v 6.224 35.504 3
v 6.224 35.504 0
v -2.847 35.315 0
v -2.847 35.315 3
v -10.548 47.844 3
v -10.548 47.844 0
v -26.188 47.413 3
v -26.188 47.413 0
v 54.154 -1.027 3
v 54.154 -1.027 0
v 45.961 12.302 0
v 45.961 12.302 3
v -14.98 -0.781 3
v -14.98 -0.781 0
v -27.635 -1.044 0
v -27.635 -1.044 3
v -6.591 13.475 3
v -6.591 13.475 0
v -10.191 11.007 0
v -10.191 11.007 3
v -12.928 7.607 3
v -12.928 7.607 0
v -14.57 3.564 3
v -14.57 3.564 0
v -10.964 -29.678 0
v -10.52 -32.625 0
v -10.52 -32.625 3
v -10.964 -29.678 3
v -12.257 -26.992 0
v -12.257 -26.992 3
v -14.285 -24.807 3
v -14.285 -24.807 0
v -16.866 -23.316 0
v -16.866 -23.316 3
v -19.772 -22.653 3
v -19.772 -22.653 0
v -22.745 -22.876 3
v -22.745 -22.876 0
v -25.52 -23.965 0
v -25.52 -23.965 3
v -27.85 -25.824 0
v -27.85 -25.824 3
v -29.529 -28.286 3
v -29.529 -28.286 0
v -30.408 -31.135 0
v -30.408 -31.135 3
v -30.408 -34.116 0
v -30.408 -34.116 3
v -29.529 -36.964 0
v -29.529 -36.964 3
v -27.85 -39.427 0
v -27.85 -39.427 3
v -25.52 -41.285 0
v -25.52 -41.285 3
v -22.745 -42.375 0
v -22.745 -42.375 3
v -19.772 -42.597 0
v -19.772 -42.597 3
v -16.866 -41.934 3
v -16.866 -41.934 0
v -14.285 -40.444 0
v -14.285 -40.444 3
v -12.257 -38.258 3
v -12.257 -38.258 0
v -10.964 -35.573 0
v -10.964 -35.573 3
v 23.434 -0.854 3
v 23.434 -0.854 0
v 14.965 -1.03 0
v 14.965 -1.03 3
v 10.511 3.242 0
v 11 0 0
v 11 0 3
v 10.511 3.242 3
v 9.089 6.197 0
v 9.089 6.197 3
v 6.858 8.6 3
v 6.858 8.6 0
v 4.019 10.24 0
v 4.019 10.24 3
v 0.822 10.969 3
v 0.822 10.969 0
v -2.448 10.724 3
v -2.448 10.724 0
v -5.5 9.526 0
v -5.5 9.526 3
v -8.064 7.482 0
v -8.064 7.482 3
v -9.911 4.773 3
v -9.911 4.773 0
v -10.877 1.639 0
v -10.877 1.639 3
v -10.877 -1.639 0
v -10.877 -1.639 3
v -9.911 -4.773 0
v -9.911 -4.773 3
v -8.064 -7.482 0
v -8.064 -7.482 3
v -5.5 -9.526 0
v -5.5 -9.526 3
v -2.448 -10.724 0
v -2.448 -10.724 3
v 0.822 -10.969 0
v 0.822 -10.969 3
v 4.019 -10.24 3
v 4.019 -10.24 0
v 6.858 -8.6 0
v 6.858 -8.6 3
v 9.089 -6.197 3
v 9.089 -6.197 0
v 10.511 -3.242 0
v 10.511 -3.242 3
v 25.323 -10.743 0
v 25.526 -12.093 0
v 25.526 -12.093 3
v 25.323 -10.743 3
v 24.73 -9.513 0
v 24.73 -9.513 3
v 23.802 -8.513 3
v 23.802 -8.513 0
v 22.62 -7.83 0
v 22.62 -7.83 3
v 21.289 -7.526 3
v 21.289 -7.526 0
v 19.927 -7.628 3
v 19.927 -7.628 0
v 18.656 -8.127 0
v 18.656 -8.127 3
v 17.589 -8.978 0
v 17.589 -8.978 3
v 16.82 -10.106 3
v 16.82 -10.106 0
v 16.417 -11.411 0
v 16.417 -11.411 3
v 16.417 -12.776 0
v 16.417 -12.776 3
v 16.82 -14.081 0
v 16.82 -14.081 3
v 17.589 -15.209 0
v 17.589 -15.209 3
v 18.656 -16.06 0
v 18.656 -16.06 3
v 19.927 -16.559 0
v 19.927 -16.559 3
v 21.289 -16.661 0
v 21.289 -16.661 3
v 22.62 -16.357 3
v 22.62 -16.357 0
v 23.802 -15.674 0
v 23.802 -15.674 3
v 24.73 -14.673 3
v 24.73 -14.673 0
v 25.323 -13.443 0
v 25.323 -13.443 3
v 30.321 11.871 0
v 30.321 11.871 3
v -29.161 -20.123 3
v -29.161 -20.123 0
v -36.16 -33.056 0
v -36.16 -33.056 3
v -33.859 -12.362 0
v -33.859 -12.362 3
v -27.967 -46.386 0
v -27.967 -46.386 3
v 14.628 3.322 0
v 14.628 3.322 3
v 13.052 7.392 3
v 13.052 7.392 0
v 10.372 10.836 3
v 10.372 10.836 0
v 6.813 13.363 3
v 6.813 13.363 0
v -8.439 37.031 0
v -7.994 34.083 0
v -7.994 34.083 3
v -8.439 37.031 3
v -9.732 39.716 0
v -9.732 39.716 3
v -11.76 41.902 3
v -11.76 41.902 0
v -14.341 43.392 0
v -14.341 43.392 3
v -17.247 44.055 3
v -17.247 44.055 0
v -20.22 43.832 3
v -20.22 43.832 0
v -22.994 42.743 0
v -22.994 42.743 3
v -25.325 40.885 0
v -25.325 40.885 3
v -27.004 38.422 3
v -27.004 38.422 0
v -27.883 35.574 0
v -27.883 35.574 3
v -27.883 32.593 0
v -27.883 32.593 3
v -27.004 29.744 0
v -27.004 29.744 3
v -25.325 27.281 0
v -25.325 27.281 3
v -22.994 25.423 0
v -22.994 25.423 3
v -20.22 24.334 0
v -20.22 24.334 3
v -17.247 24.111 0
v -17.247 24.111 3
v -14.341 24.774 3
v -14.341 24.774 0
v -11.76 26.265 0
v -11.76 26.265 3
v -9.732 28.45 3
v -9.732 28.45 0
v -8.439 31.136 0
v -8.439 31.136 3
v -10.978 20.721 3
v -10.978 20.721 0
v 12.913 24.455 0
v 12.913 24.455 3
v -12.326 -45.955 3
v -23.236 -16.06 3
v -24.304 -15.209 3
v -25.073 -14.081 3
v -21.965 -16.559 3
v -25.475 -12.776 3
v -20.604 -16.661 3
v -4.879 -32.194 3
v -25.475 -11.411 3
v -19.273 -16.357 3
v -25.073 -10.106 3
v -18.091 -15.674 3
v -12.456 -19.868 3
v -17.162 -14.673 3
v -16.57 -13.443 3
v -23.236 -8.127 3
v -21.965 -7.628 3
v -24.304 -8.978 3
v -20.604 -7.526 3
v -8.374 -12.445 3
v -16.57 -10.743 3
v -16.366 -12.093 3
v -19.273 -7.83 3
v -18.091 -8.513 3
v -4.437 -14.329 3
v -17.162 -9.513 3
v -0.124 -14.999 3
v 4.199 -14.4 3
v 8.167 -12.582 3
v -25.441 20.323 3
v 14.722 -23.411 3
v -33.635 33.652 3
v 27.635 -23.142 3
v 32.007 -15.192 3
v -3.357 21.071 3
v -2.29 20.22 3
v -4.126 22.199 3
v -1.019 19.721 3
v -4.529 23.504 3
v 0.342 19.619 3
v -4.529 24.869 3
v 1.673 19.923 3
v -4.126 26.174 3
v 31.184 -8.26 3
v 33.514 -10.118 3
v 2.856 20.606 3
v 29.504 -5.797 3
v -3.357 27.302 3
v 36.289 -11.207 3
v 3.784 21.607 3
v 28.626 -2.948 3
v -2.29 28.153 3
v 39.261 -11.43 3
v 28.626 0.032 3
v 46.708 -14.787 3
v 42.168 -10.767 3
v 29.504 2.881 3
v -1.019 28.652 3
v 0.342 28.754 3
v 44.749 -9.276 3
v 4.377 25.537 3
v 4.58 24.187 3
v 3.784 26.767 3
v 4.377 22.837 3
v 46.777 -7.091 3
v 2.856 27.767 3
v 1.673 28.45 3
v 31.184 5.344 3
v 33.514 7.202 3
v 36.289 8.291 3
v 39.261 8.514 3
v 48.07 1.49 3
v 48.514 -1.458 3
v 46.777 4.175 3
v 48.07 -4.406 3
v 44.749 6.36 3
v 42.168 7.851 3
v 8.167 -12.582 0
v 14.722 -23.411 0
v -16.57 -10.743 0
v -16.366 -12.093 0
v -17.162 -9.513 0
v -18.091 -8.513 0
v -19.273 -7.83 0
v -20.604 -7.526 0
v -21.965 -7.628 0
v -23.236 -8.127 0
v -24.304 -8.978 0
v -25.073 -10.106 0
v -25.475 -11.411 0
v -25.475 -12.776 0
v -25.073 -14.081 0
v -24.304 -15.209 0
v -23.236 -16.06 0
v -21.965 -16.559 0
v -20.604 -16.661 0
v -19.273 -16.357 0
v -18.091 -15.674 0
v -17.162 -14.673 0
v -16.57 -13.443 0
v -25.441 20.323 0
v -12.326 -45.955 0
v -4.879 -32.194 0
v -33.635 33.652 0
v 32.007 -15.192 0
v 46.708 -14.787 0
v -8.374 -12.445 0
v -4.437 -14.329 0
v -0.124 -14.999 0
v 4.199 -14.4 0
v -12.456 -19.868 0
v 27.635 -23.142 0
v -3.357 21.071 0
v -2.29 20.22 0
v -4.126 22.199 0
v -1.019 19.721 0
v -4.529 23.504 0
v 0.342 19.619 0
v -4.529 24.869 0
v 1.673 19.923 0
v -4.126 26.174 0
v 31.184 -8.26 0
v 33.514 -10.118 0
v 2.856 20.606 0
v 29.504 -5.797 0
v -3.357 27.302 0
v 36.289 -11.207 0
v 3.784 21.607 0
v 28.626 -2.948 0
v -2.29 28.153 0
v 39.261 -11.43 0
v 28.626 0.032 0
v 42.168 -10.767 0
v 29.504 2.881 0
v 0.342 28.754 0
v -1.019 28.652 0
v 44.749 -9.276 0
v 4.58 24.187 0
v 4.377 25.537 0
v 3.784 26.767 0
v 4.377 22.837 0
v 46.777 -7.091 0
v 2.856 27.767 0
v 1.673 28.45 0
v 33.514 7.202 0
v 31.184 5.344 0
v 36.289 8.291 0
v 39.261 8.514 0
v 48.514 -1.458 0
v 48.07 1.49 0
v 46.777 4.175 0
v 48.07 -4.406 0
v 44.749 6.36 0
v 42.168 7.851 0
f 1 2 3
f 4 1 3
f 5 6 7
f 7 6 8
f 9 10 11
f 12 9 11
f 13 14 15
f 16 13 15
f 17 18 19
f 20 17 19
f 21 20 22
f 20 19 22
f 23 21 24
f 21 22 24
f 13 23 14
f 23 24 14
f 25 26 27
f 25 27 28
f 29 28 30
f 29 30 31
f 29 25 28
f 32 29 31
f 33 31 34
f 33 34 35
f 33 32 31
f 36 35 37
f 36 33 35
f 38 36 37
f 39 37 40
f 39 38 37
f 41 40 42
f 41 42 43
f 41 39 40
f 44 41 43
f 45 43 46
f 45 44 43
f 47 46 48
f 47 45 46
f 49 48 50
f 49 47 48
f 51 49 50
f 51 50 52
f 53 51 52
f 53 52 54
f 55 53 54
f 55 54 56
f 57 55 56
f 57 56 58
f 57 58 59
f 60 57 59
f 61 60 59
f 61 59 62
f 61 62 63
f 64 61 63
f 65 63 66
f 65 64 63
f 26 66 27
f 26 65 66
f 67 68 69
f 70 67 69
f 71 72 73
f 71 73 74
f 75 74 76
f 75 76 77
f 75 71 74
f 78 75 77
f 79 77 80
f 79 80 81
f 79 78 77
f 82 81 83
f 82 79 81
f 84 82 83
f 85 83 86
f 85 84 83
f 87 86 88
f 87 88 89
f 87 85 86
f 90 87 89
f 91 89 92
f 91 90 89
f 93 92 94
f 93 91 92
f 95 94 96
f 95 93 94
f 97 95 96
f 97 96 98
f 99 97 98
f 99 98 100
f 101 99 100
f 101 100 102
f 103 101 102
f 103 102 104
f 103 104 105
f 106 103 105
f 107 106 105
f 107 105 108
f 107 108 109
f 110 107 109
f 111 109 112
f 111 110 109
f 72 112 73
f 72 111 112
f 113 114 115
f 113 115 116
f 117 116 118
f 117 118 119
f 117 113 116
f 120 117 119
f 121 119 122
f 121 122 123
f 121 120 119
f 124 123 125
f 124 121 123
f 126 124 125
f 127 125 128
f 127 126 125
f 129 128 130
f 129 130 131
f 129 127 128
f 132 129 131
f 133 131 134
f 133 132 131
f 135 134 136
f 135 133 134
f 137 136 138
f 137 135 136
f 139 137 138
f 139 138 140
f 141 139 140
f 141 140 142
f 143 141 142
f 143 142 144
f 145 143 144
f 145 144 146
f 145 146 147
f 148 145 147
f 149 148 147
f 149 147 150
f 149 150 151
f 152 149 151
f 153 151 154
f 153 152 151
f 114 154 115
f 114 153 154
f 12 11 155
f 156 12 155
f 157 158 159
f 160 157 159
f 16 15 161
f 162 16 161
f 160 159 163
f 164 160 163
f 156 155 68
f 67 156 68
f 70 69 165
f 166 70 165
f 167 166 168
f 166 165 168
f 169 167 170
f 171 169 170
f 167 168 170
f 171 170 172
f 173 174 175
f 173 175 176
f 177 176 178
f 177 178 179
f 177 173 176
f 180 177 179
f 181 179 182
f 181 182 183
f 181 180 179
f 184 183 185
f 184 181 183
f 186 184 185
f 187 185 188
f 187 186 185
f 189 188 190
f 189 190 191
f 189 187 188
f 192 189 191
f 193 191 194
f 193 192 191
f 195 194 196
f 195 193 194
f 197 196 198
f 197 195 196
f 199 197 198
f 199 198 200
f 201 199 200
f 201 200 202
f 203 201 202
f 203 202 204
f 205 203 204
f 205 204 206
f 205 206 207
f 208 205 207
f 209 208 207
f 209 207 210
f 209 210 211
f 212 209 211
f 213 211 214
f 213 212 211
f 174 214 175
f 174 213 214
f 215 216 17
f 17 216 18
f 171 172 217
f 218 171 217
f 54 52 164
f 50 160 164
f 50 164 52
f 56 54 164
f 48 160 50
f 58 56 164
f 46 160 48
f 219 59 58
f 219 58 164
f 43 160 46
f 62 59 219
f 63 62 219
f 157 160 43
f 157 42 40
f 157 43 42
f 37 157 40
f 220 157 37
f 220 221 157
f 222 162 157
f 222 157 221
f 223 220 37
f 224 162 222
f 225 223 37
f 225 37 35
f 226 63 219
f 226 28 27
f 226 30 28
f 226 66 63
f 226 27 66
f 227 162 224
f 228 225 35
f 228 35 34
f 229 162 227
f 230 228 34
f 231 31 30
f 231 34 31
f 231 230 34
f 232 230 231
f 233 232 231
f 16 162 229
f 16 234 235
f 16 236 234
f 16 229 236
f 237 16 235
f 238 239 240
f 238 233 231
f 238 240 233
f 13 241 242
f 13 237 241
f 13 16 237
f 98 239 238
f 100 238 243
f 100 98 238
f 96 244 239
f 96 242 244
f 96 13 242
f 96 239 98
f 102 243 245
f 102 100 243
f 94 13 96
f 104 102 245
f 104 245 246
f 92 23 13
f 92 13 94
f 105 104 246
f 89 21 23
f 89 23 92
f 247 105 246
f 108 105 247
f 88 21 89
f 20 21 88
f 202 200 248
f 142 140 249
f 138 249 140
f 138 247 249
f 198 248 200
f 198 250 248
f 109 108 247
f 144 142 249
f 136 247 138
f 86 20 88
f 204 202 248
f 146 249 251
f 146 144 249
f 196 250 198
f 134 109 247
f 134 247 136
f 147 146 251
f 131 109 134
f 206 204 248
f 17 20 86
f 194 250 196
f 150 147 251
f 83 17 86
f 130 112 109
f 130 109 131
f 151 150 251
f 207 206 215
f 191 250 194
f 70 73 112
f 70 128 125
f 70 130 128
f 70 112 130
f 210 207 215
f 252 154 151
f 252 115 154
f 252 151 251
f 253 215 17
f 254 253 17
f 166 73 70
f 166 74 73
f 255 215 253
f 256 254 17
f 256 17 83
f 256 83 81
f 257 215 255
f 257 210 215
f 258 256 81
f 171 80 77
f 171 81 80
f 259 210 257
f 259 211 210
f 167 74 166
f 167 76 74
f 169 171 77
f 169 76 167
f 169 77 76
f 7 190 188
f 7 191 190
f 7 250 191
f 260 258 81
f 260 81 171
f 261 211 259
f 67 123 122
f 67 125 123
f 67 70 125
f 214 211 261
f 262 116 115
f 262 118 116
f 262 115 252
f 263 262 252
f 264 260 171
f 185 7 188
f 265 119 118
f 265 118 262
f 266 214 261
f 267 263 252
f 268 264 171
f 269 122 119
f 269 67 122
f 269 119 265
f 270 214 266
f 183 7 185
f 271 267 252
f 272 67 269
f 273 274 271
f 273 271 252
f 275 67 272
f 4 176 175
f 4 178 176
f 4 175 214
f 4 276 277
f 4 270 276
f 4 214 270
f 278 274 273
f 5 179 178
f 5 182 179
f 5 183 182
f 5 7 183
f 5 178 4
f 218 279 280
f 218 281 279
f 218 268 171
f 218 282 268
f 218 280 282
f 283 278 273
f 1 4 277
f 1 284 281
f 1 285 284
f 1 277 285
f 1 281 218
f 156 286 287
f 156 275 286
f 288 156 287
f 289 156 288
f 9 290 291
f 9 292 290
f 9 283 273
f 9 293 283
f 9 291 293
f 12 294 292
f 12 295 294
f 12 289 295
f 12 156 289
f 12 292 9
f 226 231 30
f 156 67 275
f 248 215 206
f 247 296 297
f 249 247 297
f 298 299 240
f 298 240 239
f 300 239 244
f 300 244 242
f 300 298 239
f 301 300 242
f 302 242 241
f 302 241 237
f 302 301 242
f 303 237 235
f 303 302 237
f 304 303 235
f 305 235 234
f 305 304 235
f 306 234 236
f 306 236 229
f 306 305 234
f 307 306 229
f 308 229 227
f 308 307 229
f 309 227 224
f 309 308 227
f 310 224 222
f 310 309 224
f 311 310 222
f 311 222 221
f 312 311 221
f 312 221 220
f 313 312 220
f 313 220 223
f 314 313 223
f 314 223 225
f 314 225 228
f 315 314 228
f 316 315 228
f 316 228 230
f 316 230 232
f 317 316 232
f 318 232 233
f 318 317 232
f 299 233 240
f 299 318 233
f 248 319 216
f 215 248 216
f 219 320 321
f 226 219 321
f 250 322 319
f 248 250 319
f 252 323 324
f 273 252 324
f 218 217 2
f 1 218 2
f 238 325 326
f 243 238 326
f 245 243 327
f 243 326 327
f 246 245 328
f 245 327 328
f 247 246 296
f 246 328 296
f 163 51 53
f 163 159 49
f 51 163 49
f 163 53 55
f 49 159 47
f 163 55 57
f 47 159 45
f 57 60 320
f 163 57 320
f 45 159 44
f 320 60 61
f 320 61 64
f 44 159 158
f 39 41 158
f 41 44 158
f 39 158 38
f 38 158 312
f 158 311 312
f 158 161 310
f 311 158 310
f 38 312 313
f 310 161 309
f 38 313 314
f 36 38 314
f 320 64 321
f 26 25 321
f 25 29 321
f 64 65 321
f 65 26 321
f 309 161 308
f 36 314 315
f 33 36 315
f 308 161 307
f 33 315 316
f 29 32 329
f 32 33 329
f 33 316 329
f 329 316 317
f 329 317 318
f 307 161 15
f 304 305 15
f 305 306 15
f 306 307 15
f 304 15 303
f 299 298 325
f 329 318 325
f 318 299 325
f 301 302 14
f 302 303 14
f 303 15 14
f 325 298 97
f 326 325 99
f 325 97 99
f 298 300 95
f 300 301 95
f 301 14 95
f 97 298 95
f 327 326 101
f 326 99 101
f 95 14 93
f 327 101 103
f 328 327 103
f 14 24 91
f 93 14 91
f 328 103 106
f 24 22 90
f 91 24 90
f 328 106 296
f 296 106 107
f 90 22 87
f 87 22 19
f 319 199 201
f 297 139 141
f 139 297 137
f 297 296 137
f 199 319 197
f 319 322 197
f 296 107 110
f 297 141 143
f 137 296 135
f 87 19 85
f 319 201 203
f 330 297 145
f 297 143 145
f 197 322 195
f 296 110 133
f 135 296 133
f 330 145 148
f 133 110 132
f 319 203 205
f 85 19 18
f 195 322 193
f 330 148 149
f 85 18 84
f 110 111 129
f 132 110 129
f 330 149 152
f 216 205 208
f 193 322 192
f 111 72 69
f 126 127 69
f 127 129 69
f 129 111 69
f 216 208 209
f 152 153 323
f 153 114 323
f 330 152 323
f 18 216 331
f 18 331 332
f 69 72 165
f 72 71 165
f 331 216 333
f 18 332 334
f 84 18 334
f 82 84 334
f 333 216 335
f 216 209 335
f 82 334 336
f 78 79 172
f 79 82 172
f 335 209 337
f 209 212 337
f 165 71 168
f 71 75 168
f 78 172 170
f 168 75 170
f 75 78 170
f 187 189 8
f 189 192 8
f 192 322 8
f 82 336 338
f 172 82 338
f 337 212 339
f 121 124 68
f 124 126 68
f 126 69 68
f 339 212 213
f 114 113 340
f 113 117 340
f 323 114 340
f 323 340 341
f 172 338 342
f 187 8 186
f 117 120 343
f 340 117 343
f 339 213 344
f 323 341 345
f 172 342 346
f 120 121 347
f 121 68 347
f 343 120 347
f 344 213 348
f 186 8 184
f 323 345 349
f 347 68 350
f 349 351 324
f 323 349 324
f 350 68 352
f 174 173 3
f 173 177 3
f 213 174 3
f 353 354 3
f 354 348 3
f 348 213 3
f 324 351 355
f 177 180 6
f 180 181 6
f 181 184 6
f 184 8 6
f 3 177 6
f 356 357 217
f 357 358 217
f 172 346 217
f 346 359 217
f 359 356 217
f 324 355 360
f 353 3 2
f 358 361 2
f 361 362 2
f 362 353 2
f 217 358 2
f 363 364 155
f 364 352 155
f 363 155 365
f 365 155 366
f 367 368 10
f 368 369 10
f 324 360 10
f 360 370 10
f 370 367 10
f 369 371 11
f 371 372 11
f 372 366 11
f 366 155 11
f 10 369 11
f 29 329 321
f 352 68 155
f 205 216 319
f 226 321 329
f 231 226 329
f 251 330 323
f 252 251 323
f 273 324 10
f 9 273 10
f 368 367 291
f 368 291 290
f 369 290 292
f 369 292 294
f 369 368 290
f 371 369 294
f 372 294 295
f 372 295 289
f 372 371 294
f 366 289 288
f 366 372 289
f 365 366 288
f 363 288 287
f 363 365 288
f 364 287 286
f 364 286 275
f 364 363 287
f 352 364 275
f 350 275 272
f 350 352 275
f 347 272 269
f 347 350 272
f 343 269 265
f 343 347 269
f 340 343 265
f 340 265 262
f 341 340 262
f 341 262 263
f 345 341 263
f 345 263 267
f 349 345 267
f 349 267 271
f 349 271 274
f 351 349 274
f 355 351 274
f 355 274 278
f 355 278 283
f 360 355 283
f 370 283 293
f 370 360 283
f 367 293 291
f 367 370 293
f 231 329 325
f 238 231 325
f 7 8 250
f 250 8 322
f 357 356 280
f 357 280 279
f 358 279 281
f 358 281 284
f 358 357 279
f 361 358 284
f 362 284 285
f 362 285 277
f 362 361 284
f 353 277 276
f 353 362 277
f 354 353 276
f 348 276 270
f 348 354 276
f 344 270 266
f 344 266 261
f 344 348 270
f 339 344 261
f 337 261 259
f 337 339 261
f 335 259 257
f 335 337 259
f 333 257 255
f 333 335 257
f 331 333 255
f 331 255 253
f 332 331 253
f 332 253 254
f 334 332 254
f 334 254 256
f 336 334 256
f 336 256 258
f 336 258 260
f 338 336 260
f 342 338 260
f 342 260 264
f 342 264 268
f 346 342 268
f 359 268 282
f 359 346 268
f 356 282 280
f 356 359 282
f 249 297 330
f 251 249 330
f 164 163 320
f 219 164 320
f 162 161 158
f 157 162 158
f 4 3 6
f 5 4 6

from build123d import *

# Parameters (mm, degrees)
F0_R     = 10
F0_R_2   = 4.58
F0_R_3   = 11
F1_DEPTH = 3


with BuildPart() as f1:
    # F0 (on Top) → F1 (new body)
    with BuildSketch(Plane.XY):
        with BuildLine():
            Line((-10.977667, 20.721382), (-6.590549, 13.474593))
            ThreePointArc((-6.590549, 13.474593), (-12.927762, 7.607429), (-14.979629, -0.781476))
            Line((-14.979629, -0.781476), (-27.635152, -1.044408))
            Line((-27.635152, -1.044408), (-33.859359, -12.361615))
            Line((-33.859359, -12.361615), (-29.160745, -20.122942))
            Line((-29.160745, -20.122942), (-36.160002, -33.056272))
            Line((-36.160002, -33.056272), (-27.966558, -46.385655))
            Line((-27.966558, -46.385655), (-12.326252, -45.954617))
            Line((-12.326252, -45.954617), (-4.879389, -32.194194))
            Line((-4.879389, -32.194194), (-12.45641, -19.867629))
            Line((-12.45641, -19.867629), (-8.374066, -12.444879))
            ThreePointArc((-8.374066, -12.444879), (-0.124346, -14.999485), (8.166593, -12.582001))
            Line((8.166593, -12.582001), (14.72206, -23.41054))
            Line((14.72206, -23.41054), (27.635152, -23.142257))
            Line((27.635152, -23.142257), (32.007352, -15.192475))
            Line((32.007352, -15.192475), (46.707572, -14.787345))
            Line((46.707572, -14.787345), (54.154435, -1.026922))
            Line((54.154435, -1.026922), (45.960991, 12.302461))
            Line((45.960991, 12.302461), (30.320685, 11.871423))
            Line((30.320685, 11.871423), (23.434076, -0.853753))
            Line((23.434076, -0.853753), (14.964615, -1.029714))
            ThreePointArc((14.964615, -1.029714), (13.052108, 7.392056), (6.813036, 13.363478))
            Line((6.813036, 13.363478), (12.913093, 24.454948))
            Line((12.913093, 24.454948), (6.224207, 35.503873))
            Line((6.224207, 35.503873), (-2.846607, 35.315417))
            Line((-2.846607, 35.315417), (-10.54757, 47.843616))
            Line((-10.54757, 47.843616), (-26.187877, 47.412578))
            Line((-26.187877, 47.412578), (-33.63474, 33.652155))
            Line((-33.63474, 33.652155), (-25.441296, 20.322772))
            Line((-25.441296, 20.322772), (-10.977667, 20.721382))
        make_face()
        with Locations((-20.519695, -32.625233)):
            Circle(F0_R, mode=Mode.SUBTRACT)
        with Locations((-20.946266, -12.093333)):
            Circle(F0_R_2, mode=Mode.SUBTRACT)
        Circle(F0_R_3, mode=Mode.SUBTRACT)
        with Locations((20.946266, -12.093333)):
            Circle(F0_R_2, mode=Mode.SUBTRACT)
        with Locations((38.514128, -1.457961)):
            Circle(F0_R, mode=Mode.SUBTRACT)
        with Locations((0, 24.186665)):
            Circle(F0_R_2, mode=Mode.SUBTRACT)
        with Locations((-17.994433, 34.083194)):
            Circle(F0_R, mode=Mode.SUBTRACT)
    extrude(amount=F1_DEPTH)


solid = f1.part
